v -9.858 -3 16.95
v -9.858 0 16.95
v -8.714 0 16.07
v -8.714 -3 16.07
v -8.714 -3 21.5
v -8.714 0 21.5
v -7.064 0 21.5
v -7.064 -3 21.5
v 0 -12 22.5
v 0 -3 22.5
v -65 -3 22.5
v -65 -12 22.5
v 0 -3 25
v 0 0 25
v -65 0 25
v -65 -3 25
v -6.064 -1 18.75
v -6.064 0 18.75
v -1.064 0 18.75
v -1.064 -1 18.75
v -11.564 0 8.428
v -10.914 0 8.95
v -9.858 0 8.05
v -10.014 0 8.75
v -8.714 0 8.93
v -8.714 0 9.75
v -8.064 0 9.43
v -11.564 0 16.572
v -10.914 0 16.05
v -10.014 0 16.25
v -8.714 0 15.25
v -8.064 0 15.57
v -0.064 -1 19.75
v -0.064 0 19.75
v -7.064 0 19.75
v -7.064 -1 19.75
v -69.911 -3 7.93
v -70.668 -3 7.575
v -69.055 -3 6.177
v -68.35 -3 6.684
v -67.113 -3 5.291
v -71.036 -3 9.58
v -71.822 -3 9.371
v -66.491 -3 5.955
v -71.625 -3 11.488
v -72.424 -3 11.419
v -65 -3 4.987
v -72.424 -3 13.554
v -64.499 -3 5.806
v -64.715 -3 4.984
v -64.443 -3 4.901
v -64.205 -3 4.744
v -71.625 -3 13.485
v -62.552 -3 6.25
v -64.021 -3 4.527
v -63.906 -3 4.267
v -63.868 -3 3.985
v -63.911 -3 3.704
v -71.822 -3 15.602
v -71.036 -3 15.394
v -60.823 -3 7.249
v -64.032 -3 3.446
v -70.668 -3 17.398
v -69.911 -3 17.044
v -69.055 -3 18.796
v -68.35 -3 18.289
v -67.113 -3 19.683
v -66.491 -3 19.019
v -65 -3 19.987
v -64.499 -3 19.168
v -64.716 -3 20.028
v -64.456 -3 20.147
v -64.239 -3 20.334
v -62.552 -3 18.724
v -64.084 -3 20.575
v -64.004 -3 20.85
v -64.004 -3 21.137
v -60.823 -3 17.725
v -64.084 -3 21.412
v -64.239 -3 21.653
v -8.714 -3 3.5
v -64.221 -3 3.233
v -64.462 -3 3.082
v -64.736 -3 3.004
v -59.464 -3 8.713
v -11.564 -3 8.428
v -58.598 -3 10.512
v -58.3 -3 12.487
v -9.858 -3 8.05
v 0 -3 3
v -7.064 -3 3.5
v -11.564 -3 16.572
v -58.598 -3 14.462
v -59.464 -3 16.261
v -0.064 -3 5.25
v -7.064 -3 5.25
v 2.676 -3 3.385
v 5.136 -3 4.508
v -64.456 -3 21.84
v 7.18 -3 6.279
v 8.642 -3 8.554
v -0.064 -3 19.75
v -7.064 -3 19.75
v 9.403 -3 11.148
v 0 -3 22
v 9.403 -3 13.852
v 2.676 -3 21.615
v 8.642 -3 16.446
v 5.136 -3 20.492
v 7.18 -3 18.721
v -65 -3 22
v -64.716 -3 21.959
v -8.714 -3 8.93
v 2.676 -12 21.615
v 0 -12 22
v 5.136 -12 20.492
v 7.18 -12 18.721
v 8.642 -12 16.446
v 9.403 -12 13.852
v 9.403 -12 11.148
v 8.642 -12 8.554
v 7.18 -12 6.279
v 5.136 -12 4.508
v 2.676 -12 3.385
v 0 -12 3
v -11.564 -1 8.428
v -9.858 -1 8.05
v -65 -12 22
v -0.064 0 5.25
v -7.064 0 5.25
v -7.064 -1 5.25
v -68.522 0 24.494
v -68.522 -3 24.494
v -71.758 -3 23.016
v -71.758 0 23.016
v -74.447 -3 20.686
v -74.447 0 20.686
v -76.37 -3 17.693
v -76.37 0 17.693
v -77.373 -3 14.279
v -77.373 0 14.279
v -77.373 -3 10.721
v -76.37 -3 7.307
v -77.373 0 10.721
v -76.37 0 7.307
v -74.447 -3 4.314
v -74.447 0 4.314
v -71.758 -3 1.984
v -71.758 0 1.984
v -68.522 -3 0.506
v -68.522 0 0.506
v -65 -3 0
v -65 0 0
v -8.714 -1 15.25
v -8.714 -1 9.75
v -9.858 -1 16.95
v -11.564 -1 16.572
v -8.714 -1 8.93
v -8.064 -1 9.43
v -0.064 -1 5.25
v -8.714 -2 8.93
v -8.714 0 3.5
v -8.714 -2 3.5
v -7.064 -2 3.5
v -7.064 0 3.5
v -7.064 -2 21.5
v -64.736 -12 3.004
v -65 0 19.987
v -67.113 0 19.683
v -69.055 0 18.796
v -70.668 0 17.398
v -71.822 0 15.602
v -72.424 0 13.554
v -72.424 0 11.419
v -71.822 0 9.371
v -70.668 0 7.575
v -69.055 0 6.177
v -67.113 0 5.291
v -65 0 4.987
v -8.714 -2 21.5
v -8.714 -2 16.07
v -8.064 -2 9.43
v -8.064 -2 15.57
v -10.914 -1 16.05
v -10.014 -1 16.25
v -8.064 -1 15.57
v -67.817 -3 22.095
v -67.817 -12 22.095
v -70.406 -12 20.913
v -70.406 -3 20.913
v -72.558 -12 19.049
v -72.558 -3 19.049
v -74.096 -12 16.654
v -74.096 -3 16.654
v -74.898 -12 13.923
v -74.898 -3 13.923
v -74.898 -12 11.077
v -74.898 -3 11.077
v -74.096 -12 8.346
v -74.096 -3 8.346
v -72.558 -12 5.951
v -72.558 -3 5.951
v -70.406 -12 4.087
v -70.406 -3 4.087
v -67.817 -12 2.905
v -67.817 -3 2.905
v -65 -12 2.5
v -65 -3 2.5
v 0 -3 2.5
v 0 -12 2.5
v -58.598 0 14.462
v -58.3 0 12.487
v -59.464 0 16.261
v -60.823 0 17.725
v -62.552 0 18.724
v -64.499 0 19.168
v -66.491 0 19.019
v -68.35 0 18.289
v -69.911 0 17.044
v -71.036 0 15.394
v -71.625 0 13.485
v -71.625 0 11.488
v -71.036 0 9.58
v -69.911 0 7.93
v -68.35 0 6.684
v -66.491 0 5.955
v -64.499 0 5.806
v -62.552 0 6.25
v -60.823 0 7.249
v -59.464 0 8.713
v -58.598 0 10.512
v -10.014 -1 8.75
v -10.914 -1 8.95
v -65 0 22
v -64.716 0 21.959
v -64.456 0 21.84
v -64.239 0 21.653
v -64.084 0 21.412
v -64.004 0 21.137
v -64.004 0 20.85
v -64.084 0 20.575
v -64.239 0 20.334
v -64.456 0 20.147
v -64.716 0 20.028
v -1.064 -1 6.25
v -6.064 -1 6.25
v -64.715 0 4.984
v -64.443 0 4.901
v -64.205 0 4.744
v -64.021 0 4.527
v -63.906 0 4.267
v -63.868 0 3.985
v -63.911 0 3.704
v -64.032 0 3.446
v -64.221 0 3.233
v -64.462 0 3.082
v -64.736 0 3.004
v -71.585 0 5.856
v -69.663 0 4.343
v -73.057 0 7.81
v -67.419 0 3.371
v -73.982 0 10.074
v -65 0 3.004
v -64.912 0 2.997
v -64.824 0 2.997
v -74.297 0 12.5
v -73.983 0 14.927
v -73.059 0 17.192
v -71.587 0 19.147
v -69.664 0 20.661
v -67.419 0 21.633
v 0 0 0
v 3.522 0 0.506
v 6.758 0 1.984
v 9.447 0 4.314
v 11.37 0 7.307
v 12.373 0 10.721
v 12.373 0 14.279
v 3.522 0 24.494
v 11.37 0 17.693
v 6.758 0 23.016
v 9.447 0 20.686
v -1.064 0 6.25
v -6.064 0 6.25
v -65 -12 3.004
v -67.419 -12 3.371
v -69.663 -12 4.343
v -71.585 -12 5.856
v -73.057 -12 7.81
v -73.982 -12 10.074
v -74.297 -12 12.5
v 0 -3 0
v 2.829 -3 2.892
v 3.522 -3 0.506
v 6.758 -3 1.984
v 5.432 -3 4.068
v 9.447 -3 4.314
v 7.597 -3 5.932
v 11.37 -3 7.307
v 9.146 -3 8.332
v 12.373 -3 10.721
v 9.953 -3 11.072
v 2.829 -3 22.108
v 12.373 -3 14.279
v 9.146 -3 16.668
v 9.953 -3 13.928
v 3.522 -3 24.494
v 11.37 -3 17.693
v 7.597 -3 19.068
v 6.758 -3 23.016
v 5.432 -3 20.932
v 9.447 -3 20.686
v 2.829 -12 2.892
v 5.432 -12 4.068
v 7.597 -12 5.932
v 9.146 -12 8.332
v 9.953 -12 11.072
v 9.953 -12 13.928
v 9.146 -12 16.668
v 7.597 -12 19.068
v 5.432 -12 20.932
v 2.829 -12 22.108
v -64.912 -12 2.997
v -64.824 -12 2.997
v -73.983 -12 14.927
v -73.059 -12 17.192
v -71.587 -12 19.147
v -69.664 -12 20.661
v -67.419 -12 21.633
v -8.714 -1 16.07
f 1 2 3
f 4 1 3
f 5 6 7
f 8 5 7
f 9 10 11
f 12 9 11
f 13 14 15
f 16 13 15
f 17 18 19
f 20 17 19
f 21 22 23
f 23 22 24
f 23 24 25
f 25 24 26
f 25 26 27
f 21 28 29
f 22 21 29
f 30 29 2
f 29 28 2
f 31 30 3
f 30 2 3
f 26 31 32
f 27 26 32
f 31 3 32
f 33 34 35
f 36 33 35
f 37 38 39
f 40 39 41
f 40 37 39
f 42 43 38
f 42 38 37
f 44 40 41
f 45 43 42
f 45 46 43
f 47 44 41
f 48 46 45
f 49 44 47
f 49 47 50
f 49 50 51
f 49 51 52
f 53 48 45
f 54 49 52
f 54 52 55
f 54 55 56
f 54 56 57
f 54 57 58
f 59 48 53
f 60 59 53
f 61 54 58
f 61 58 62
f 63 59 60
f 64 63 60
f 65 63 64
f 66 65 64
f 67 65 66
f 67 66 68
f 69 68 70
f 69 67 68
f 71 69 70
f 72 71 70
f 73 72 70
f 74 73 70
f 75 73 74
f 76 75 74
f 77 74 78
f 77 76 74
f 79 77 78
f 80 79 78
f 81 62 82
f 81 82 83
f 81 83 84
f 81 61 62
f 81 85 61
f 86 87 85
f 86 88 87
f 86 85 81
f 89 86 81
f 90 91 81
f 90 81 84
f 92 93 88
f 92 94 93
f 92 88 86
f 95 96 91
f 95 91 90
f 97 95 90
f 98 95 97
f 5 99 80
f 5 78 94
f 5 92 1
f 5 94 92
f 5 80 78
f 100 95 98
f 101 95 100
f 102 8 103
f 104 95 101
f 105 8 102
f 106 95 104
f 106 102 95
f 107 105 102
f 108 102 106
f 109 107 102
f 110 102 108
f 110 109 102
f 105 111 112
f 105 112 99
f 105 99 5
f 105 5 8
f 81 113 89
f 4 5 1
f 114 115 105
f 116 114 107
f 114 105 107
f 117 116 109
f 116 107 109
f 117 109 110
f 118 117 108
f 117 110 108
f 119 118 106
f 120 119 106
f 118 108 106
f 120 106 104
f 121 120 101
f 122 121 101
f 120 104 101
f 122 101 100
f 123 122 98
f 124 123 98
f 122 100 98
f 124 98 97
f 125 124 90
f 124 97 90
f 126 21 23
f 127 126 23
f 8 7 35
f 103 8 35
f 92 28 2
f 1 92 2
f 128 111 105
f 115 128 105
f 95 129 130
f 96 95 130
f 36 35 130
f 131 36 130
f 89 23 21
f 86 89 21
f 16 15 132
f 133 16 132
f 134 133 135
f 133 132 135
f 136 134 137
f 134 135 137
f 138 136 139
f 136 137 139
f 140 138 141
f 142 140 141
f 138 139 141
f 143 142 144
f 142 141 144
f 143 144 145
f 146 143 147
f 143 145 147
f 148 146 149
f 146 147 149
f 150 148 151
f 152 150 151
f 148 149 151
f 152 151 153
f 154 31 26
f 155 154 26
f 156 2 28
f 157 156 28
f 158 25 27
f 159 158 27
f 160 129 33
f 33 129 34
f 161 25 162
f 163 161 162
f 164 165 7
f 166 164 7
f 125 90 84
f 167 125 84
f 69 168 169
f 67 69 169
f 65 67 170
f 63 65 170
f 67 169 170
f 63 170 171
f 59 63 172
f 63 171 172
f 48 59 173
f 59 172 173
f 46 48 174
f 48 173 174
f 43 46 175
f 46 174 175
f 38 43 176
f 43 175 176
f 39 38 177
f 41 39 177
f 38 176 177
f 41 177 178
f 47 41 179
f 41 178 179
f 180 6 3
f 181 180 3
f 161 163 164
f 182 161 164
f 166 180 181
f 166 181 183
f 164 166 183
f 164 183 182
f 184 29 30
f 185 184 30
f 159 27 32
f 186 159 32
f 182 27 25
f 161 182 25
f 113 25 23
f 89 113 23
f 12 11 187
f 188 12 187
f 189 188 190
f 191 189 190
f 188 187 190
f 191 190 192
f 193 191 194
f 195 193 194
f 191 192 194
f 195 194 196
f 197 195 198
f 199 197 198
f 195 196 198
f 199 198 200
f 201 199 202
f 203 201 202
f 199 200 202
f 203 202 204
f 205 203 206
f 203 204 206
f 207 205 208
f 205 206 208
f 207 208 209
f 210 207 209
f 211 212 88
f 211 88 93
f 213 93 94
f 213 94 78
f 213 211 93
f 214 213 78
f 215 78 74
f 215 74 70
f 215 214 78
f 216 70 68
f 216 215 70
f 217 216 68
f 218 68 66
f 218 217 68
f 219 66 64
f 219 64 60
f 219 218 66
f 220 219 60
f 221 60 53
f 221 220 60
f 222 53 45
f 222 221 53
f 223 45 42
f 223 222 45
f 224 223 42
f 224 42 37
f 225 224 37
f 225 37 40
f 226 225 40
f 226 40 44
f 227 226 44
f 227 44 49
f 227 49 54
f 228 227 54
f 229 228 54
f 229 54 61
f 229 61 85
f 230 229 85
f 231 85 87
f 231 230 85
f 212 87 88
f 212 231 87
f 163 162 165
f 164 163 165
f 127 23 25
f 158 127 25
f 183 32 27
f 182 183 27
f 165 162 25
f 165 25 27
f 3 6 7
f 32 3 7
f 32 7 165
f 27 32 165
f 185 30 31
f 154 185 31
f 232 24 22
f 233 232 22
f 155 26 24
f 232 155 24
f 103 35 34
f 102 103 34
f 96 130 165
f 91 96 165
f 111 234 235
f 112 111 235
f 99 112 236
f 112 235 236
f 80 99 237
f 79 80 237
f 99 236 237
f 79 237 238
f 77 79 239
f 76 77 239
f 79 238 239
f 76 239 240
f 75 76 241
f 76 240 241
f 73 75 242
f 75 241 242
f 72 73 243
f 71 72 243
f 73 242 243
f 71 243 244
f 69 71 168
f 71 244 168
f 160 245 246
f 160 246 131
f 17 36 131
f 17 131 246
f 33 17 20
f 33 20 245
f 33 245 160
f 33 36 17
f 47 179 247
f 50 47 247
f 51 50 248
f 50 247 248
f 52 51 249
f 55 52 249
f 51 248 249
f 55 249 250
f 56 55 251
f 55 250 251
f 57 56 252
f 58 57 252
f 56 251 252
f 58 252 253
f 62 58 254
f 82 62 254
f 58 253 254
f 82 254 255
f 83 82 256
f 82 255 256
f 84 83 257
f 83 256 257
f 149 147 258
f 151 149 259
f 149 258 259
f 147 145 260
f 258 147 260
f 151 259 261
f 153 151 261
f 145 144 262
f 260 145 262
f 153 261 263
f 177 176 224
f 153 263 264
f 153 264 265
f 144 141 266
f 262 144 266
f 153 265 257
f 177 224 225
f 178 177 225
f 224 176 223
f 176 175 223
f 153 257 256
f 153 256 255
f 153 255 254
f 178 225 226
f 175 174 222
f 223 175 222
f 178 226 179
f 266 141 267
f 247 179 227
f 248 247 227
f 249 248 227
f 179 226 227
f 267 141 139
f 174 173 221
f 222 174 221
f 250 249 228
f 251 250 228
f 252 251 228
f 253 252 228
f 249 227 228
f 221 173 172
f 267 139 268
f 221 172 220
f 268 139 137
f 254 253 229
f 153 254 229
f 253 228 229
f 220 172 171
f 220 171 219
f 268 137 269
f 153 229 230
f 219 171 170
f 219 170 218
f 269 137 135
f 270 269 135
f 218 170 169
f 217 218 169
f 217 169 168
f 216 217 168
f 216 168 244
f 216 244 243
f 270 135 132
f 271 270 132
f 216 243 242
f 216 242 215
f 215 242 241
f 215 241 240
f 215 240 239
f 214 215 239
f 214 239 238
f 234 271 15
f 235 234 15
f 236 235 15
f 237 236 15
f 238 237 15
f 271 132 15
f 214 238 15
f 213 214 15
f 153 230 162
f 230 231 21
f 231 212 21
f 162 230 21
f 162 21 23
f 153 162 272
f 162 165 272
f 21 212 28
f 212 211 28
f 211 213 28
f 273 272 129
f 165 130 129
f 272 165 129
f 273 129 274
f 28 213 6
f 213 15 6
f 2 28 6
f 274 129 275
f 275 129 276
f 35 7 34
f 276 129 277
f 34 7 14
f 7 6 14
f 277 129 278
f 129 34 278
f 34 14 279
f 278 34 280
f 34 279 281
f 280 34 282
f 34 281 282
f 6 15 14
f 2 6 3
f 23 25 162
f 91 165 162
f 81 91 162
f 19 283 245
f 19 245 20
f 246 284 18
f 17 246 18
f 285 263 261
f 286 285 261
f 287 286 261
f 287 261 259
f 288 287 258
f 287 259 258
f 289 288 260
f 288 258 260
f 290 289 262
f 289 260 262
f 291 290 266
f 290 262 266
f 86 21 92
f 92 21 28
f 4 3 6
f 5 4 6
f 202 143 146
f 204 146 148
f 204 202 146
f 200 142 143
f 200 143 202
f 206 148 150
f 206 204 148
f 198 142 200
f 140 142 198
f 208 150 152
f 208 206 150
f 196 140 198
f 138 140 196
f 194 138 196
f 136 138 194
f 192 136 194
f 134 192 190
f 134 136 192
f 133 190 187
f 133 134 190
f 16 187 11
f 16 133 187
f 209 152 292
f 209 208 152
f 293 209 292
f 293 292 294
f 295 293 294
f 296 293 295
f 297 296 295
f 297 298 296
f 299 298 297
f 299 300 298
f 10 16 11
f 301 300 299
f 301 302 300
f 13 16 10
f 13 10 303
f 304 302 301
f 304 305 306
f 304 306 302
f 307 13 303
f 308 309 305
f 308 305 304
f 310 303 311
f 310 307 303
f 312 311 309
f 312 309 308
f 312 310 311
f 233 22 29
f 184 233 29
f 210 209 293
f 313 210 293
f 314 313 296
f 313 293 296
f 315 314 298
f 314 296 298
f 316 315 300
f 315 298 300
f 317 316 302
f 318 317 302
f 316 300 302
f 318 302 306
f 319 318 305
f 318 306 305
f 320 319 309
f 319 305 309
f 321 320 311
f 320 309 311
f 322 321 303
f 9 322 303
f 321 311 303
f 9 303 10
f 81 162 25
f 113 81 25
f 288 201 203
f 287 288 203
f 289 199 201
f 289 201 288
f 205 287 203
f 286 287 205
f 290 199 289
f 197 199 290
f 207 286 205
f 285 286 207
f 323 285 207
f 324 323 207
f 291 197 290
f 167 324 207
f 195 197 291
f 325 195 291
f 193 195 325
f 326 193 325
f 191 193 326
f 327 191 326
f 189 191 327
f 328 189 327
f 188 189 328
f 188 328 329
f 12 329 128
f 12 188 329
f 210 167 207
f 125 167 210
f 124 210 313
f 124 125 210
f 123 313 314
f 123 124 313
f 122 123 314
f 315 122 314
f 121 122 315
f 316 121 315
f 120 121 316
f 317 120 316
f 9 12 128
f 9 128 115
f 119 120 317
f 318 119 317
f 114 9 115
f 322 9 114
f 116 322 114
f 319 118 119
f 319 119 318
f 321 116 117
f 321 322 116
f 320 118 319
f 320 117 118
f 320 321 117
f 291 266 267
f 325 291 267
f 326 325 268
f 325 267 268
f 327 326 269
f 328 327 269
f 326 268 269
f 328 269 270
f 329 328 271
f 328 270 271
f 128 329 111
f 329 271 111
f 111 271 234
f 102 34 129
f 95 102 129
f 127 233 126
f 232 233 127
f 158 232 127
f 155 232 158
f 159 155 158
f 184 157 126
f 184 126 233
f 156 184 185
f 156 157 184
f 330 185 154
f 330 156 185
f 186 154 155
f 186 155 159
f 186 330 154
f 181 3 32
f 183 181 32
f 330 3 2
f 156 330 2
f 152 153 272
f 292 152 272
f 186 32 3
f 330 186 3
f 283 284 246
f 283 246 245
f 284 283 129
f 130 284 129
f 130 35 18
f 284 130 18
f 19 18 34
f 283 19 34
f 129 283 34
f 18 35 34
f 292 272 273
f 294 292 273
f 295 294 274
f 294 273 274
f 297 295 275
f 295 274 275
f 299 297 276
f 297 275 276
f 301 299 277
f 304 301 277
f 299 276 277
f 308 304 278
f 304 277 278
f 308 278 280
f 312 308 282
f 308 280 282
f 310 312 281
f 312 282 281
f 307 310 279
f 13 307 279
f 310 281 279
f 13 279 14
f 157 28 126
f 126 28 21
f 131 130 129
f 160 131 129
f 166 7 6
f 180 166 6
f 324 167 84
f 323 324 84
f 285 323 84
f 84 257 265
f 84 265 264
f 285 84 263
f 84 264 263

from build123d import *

# Parameters (mm, degrees)
F0_R     = 6.7
F1_DEPTH = 3
F2_DEPTH = 2
F0_W     = 5
F0_H     = 12.5
F3_DEPTH = 1
F4_DEPTH = 12


# Not quite as in the source:
# - ends of sketch curves that miss each other by under 0.0002 mm in the source are joined
# - a feature names something its author has since deleted; it is built from what else it names


with BuildPart() as f1:
    # F0 (on Front) → F1 (new body)
    with BuildSketch(Plane.XZ):
        with BuildLine():
            ThreePointArc((-65, 22), (-63.9934095883, 20.9934095883), (-65, 19.9868191765))
            ThreePointArc((-65, 19.9868191765), (-72.5, 12.4868191765), (-65, 4.9868191765))
            ThreePointArc((-65, 4.9868191765), (-63.8767141262, 4.1275392339), (-64.7360688632, 3.0043105795))
            Line((-64.7360688632, 3.0043105795), (0, 3))
            ThreePointArc((0, 3), (9.5, 12.5), (0, 22))
            Line((0, 22), (-65, 22))
        make_face()
        with Locations((-65, 12.4868191765)):
            Circle(F0_R, mode=Mode.SUBTRACT)
        Polygon((-7.0638221186, 19.7500795352), (-0.0638221186, 19.7500795352), (-0.0638221186, 5.2500795352), (-7.0638221186, 5.2500795352), (-7.0638221186, 3.5000024036), (-8.713822115, 3.5001122721), (-8.713822115, 8.9301122721), (-9.8584694148, 8.0498078222), (-11.5638221186, 8.4283766224), (-11.5638221186, 12.5000409694), (-11.5638221186, 16.5717053165), (-9.8584694148, 16.9502741166), (-8.713822115, 16.0699696667), (-8.713822115, 21.4999696667), (-7.0638221186, 21.5000795352), align=None, mode=Mode.SUBTRACT)
    extrude(amount=F1_DEPTH)



with BuildPart() as f1b:
    # F0 (on Front) → F1, piece 2 (new body)
    with BuildSketch(Plane.XZ):
        with BuildLine():
            Line((-65, 0), (0, 0))
            ThreePointArc((0, 0), (12.5, 12.5), (0, 25))
            Line((0, 25), (-65, 25))
            ThreePointArc((-65, 25), (-77.5, 12.5), (-65, 0))
        make_face()
        with BuildLine():
            ThreePointArc((-2.276e-07, 22.5000819376), (10.0557466602, 12.5000410832), (0, 2.5))
            Line((0, 2.5), (-65, 2.5))
            ThreePointArc((-65, 2.5), (-75.0000410826, 12.500040855), (-65.0000002276, 22.5000819376))
            Line((-65.0000002276, 22.5000819376), (-2.276e-07, 22.5000819376))
        make_face(mode=Mode.SUBTRACT)
    extrude(amount=F1_DEPTH)


with BuildPart() as f2:
    # F0 (on Front) → F2 (new body)
    with BuildSketch(Plane.XZ):
        Polygon((-7.0638221186, 12.5000795352), (-7.0638221186, 19.7500795352), (-7.0638221186, 21.5000795352), (-8.713822115, 21.4999696667), (-8.713822115, 16.0699696667), (-8.0638221186, 15.5700795352), (-8.0638221186, 9.4300024036), (-8.713822115, 8.9301122721), (-8.713822115, 3.5001122721), (-7.0638221186, 3.5000024036), (-7.0638221186, 5.2500024036), (-7.0638221186, 9.4300024036), align=None)
    extrude(amount=F2_DEPTH)


with BuildPart() as f3:
    # F0 (on Front) → F3 (new body)
    with BuildSketch(Plane.XZ):
        Polygon((-0.0638221186, 5.2500795352), (-0.0638221186, 19.7500795352), (-7.0638221186, 19.7500795352), (-7.0638221186, 12.5000795352), (-7.0638221186, 9.4300024036), (-7.0638221186, 5.2500795352), align=None)
        with Locations((-3.5638221186, 12.5000795352)):
            Rectangle(F0_W, F0_H, mode=Mode.SUBTRACT)
    extrude(amount=F3_DEPTH)


with BuildPart() as f3b:
    # F0 (on Front) → F3, piece 2 (new body)
    with BuildSketch(Plane.XZ):
        Polygon((-8.0638221186, 15.5700795352), (-8.713822115, 16.0699696667), (-9.8584694148, 16.9502741166), (-11.5638221186, 16.5717053165), (-11.5638221186, 12.5000409694), (-11.5638221186, 8.4283766224), (-9.8584694148, 8.0498078222), (-8.713822115, 8.9301122721), (-8.0638221186, 9.4300024036), align=None)
        Polygon((-10.0138316441, 16.249757261), (-8.7138221186, 15.2499696667), (-8.7138221186, 9.7501122721), (-10.0138316441, 8.7503246778), (-10.9138221186, 8.9501122721), (-10.9138221186, 9.7501122721), (-10.9138221186, 16.0499696667), align=None, mode=Mode.SUBTRACT)
    extrude(amount=F3_DEPTH)


with BuildPart() as f1_1:
    add(f1.part)

    add(f1b.part)  # F4 merges F1b
    # F0 (on Front) → F4 (join)
    with BuildSketch(Plane.XZ):
        with BuildLine():
            Line((-65, 2.5), (0, 2.5))
            ThreePointArc((0, 2.5), (10.0557466602, 12.5000410832), (-2.276e-07, 22.5000819376))
            Line((-2.276e-07, 22.5000819376), (-65.0000002276, 22.5000819376))
            ThreePointArc((-65.0000002276, 22.5000819376), (-75.0000410826, 12.500040855), (-65, 2.5))
        make_face()
        with BuildLine():
            ThreePointArc((-74.2972368995, 12.5000409694), (-71.5868031052, 19.1468457066), (-65, 22))
            Line((-65, 22), (0, 22))
            ThreePointArc((0, 22), (9.5, 12.5), (0, 3))
            Line((0, 3), (-64.7360688632, 3.0043105795))
            ThreePointArc((-64.7360688632, 3.0043105795), (-64.8680350139, 2.9955736674), (-65, 3.0043281539))
            ThreePointArc((-65, 3.0043281539), (-71.5853179489, 5.855965247), (-74.2972368995, 12.5000409694))
        make_face(mode=Mode.SUBTRACT)
    extrude(amount=F4_DEPTH)


solid = Compound([f2.part, f3.part, f3b.part, f1_1.part])
